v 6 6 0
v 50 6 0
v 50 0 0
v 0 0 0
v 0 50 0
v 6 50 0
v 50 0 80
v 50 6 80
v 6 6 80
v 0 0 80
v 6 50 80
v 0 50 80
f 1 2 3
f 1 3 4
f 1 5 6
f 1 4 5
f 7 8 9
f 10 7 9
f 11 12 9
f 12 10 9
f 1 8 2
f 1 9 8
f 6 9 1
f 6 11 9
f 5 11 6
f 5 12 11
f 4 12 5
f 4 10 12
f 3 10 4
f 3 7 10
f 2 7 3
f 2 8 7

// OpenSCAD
$fn = 32;

// ----------------------------------------------------------------------
// Structural section: angle 50 x 50 mm
// ----------------------------------------------------------------------

// --- parameters (mm) ---
sec_w = 50;               // leg width, X
sec_h = 50;               // leg height, Y
flange_t = 6;             // leg thickness
plate_t = 80;             // cut length, Z (extrusion height)

profile = [[0, 0], [50, 0], [50, 6], [6, 6], [6, 50], [0, 50]];  // primary outline, 6 points, counter clockwise

// --- the one profile operation ---
linear_extrude(height = plate_t) polygon(points = profile);
